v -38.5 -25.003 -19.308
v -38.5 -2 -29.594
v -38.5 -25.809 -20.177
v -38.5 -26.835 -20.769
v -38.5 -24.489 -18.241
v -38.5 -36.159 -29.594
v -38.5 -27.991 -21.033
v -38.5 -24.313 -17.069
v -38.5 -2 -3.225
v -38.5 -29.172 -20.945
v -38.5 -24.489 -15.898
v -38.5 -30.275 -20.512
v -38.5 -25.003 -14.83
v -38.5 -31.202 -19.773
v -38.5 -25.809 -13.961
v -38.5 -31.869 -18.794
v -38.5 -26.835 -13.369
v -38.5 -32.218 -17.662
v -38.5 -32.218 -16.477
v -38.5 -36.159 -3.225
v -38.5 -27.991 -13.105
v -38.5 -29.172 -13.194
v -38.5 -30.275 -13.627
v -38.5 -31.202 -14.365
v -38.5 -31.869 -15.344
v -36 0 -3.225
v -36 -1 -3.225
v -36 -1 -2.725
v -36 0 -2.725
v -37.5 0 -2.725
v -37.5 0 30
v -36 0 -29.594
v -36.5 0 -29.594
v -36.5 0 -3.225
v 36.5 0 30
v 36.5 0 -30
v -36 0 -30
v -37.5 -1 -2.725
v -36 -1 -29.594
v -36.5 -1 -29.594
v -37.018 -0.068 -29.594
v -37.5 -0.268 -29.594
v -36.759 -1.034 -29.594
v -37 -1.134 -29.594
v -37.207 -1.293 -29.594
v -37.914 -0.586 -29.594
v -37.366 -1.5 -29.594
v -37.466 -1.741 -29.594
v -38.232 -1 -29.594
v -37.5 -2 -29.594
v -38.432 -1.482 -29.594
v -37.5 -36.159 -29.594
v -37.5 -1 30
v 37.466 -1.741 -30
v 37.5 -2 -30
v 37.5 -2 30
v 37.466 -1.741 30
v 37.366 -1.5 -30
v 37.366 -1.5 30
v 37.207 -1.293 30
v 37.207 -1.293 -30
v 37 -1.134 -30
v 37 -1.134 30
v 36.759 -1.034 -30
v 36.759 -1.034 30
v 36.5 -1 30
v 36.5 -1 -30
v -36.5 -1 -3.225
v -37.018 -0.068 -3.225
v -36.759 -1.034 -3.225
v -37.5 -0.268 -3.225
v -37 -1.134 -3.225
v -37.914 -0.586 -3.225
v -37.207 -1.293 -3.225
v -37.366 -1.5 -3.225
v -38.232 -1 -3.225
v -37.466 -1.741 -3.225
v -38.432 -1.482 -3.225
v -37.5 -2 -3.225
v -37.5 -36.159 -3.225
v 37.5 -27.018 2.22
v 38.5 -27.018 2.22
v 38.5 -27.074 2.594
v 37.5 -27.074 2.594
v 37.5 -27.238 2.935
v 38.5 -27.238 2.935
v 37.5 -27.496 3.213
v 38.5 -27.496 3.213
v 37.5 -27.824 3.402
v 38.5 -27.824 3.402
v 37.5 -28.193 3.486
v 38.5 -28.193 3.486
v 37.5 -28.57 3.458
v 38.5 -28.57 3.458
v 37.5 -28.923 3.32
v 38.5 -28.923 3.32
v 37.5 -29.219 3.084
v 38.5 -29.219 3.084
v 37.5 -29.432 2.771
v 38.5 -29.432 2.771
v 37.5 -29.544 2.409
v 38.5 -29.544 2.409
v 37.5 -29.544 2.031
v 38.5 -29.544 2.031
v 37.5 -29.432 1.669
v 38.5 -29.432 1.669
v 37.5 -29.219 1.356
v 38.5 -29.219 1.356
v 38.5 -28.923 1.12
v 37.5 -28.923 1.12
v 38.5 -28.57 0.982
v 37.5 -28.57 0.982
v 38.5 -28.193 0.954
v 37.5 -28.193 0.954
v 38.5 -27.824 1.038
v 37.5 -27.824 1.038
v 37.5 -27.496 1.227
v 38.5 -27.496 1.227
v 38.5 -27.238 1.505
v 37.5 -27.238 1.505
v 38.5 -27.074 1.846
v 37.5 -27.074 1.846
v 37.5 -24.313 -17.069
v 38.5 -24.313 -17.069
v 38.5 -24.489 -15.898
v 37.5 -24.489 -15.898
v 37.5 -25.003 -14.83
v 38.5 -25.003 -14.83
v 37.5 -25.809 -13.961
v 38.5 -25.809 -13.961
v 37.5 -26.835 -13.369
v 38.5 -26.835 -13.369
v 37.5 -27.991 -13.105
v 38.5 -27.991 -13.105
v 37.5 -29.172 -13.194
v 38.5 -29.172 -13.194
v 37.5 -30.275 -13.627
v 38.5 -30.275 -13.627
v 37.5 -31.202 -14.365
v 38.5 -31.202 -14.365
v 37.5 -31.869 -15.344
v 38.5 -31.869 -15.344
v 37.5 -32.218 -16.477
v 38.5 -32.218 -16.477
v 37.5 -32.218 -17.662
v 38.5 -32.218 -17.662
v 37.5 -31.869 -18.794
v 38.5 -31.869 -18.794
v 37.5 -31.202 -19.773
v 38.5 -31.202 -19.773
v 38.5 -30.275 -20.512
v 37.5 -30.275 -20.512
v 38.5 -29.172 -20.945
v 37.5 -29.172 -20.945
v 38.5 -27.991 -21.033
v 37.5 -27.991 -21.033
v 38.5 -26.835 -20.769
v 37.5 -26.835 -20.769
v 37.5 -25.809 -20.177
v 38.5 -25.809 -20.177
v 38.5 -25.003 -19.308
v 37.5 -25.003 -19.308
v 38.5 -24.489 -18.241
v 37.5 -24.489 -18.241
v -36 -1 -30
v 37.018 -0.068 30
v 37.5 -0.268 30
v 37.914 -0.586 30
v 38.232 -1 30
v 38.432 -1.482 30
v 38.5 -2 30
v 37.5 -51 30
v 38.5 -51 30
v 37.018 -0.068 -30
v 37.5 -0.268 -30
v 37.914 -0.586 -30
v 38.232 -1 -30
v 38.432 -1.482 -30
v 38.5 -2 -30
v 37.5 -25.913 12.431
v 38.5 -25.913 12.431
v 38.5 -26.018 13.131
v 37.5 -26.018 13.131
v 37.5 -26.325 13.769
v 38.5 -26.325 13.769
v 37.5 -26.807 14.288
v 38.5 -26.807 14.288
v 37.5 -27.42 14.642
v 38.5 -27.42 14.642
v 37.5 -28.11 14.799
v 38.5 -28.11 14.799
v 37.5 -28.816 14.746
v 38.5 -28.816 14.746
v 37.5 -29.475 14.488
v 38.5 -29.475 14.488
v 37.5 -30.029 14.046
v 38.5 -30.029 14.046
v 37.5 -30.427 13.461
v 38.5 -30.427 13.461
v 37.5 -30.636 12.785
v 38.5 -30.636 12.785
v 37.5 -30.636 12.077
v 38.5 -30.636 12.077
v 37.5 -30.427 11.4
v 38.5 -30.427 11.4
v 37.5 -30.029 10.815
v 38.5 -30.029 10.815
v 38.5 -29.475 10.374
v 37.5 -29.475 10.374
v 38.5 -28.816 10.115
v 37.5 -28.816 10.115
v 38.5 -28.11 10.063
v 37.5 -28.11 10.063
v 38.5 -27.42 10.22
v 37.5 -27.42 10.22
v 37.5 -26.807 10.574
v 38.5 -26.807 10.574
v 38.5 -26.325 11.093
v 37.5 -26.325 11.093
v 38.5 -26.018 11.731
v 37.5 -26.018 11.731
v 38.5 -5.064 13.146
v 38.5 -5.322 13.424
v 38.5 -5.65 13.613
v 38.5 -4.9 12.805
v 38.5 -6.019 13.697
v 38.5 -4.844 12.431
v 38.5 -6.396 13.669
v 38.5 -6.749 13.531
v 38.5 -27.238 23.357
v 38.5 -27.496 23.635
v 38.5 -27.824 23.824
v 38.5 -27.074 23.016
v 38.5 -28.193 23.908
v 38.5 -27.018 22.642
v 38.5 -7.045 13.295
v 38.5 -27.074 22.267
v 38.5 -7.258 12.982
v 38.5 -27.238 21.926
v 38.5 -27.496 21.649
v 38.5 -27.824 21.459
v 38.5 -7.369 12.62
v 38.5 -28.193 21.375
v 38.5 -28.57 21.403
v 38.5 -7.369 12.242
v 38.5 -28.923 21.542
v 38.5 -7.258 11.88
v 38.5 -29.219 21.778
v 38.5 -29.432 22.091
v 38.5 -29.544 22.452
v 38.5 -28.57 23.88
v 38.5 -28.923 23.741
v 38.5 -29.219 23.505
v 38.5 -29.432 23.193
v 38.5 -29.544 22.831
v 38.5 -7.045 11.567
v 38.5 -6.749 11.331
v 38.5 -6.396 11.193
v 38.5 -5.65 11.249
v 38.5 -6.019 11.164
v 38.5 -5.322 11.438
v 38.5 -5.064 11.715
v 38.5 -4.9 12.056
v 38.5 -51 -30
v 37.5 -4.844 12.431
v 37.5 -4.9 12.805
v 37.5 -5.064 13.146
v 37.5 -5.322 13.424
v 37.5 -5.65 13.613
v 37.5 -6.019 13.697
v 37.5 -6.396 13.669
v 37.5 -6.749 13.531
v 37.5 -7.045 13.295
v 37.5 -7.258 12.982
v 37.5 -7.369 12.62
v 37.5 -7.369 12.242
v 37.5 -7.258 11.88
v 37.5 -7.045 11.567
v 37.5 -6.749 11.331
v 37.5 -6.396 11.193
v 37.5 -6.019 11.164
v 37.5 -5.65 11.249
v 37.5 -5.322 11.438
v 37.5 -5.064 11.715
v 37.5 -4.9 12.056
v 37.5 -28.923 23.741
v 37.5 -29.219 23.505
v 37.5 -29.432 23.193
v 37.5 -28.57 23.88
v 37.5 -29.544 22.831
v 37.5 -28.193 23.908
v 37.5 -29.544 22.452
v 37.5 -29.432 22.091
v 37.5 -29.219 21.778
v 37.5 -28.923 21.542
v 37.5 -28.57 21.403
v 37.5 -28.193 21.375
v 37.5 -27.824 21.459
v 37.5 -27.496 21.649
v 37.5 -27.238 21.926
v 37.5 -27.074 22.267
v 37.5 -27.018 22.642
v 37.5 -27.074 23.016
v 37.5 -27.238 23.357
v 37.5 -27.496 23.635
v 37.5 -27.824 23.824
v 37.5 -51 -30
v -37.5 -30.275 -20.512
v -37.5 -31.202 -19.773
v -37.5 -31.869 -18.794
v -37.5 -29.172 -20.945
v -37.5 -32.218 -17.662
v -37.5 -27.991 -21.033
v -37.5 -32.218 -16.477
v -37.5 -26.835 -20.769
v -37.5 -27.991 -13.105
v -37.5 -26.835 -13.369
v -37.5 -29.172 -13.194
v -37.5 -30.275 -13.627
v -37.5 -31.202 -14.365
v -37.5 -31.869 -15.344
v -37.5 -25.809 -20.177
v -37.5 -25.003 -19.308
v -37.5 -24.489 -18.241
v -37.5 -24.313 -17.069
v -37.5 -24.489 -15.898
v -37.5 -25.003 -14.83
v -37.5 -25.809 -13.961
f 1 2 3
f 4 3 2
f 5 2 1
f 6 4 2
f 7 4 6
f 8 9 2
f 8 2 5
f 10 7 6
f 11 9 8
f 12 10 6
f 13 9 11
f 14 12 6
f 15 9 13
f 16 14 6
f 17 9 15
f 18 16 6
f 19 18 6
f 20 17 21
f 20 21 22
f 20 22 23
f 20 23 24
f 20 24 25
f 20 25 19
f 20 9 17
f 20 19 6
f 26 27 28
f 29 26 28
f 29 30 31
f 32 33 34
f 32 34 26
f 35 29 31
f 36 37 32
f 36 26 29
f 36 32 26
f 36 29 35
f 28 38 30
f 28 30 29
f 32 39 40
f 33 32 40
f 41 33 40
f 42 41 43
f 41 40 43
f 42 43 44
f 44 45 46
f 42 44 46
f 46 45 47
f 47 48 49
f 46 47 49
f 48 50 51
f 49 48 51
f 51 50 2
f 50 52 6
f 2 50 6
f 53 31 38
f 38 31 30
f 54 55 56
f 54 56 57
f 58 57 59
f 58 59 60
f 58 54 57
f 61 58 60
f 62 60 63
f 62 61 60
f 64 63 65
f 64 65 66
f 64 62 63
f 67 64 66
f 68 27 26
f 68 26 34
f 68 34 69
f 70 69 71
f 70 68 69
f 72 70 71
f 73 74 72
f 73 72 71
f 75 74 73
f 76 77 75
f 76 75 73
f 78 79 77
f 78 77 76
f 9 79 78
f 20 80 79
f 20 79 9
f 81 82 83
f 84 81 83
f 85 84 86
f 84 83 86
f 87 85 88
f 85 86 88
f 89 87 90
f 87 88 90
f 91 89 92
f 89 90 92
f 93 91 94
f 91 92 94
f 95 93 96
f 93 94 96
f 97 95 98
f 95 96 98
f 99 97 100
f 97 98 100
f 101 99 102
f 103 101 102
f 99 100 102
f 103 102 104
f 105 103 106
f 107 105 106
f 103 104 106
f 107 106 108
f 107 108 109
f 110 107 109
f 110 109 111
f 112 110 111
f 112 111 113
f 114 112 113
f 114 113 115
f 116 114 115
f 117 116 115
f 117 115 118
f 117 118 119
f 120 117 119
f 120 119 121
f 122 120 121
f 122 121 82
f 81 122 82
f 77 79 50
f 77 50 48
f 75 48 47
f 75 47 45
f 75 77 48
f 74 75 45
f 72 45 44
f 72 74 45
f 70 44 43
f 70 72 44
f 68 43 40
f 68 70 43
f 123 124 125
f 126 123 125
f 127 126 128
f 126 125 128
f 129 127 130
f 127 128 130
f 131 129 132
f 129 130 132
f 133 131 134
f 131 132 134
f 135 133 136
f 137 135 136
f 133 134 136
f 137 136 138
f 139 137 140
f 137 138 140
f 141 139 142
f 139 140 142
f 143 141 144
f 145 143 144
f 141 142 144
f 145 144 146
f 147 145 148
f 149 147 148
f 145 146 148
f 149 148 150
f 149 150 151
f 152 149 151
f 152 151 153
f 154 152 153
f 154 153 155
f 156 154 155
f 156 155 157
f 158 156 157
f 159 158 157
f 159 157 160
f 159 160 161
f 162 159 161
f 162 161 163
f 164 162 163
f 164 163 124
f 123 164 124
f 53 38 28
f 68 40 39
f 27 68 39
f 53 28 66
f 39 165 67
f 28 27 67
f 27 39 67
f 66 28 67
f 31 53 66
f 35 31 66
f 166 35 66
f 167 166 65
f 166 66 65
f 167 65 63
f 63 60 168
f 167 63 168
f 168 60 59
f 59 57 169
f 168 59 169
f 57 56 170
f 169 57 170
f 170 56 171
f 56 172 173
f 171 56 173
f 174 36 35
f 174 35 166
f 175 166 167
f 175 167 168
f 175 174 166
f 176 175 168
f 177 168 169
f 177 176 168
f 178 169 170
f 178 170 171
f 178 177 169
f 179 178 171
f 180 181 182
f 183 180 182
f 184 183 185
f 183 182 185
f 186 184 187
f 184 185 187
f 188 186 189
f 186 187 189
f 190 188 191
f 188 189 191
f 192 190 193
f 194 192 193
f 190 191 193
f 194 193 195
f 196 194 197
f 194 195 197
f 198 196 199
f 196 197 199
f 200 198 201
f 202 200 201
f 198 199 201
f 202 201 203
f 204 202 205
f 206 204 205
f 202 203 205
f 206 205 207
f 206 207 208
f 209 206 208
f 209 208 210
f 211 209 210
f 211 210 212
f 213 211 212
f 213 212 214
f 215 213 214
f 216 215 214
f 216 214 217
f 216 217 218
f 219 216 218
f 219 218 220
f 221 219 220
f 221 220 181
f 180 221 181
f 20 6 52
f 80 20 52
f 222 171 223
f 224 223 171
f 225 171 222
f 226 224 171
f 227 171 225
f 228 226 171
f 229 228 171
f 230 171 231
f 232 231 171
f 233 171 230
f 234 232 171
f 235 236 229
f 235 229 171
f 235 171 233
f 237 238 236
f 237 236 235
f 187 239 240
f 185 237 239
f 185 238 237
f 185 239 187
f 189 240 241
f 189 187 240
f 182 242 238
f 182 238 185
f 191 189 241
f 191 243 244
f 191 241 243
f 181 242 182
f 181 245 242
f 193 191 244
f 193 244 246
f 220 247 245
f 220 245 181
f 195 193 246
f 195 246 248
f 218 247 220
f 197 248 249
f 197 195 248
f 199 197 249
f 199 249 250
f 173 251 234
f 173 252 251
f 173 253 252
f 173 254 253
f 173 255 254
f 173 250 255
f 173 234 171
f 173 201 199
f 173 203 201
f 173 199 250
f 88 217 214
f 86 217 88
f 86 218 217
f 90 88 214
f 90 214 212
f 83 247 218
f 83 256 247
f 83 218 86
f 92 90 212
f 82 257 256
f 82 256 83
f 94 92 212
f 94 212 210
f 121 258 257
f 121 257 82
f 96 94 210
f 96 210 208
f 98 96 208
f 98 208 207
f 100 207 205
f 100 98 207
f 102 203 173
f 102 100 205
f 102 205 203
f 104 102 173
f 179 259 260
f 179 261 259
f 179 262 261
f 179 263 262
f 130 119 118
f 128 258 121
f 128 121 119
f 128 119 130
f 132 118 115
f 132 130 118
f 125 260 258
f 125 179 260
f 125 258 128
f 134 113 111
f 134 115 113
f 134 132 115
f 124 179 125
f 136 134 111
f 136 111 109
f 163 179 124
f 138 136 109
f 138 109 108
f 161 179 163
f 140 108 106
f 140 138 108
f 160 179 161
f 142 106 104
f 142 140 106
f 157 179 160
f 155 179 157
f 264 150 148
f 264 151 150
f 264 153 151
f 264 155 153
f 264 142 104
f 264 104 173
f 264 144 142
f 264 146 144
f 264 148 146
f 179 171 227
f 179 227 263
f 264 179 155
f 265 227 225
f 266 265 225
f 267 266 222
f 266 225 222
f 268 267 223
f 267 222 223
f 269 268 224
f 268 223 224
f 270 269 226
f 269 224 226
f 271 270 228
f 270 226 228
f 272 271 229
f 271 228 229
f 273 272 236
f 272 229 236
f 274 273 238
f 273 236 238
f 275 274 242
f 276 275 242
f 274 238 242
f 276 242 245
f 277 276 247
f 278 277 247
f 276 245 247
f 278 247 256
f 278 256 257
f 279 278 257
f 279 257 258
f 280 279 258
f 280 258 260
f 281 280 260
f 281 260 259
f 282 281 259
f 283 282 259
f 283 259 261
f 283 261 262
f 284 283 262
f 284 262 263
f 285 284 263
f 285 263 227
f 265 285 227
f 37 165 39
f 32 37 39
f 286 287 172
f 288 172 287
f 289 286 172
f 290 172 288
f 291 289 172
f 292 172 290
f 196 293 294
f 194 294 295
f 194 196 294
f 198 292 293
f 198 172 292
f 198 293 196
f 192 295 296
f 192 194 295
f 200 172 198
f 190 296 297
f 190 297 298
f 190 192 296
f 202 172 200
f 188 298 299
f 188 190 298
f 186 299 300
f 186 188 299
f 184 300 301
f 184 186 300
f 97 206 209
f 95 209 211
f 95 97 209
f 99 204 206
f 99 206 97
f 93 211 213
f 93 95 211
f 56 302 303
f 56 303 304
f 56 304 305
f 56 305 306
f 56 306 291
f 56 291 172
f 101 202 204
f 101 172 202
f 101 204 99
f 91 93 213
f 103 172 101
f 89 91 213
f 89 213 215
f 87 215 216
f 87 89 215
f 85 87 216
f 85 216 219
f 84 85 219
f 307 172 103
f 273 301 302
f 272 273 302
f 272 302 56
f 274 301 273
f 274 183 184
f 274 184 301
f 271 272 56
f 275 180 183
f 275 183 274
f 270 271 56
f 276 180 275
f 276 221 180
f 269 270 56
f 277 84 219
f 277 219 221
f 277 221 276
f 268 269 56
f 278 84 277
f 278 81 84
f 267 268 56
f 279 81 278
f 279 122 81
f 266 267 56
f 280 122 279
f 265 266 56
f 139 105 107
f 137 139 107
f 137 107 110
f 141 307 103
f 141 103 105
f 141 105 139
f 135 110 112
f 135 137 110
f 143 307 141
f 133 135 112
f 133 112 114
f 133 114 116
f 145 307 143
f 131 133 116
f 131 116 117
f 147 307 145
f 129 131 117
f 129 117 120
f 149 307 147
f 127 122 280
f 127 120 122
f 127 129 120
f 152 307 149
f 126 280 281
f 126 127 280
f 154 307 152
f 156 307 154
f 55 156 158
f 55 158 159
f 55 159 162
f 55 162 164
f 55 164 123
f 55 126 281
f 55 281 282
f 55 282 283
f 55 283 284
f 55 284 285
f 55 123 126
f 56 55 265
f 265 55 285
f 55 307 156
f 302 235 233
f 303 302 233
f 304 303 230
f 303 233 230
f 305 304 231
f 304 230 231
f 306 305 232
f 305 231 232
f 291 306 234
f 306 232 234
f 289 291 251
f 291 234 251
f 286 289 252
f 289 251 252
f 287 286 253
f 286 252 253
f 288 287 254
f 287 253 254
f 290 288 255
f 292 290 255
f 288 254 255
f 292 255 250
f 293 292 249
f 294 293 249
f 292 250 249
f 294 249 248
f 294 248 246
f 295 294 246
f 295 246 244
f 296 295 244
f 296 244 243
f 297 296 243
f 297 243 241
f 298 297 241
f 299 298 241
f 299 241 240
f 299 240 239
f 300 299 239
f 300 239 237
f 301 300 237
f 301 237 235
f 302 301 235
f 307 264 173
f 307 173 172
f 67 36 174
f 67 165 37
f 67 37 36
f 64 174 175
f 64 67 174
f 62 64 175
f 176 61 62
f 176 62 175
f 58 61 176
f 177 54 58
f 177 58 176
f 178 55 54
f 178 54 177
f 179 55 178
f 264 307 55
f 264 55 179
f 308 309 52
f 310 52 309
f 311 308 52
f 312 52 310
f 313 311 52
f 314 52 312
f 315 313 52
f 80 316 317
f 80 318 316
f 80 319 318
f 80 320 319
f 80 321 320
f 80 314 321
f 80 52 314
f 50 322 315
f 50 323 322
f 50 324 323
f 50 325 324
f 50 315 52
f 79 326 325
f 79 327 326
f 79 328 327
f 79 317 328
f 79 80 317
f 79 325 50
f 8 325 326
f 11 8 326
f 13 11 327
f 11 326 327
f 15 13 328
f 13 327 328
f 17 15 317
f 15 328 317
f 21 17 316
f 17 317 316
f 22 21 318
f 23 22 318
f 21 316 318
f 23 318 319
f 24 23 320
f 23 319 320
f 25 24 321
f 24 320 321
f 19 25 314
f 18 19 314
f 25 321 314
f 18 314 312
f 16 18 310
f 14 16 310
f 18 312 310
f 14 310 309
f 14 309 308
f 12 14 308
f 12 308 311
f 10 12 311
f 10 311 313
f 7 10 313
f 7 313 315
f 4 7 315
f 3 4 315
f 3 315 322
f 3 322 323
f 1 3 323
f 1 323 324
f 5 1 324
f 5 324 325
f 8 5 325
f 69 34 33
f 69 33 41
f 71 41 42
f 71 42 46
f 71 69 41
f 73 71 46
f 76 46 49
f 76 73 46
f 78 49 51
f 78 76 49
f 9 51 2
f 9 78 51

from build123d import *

# Parameters (mm, degrees)
SKETCH1_W                     = 75
SKETCH1_H                     = 60
BASE_FLANGE1_DEPTH            = 1
EDGE_FLANGE1_STRIP_W          = 6
EDGE_FLANGE1_STRIP_H          = 1
EDGE_FLANGE1_STRIP_CUT_DEPTH  = 60
EDGE_FLANGE1_DEPTH            = 60
EDGE_FLANGE3_STRIP_W          = 6
EDGE_FLANGE3_STRIP_H          = 1
EDGE_FLANGE3_STRIP_CUT_DEPTH  = 26.369340124
EDGE_FLANGE3_RELIEF_W         = 6.5
EDGE_FLANGE3_RELIEF_H         = 0.5
EDGE_FLANGE3_RELIEF_CUT_DEPTH = 1
EDGE_FLANGE3_DEPTH            = 26.369340124
SKETCH15_R                    = 1.27
SKETCH15_R_2                  = 2.3749
SKETCH15_R_3                  = 3.975
CUT_EXTRUDE4_DEPTH            = 98.10818709


# Sheet-metal steps are written as plain solids
with BuildPart() as part:
    # Sketch1 → Base-Flange1 (new body)
    with BuildSketch(Plane(origin=(0, 0, 0), x_dir=(1, 0, 0), z_dir=(0, 1, 0))):
        Rectangle(SKETCH1_W, SKETCH1_H)
    extrude(amount=-BASE_FLANGE1_DEPTH)

    # Edge-Flange1 strip (across the edge) → Edge-Flange1 strip cut (cut)
    with BuildSketch(Plane(origin=(37.5, -1, -30), x_dir=(-1, 0, 0), z_dir=(0, 0, 1))):
        with Locations((-2, -0.5)):
            Rectangle(EDGE_FLANGE1_STRIP_W, EDGE_FLANGE1_STRIP_H)
    extrude(amount=EDGE_FLANGE1_STRIP_CUT_DEPTH, mode=Mode.SUBTRACT)

    # Edge-Flange1 section (across the edge) → Edge-Flange1 (add)
    with BuildSketch(Plane(origin=(37.5, -1, -30), x_dir=(-1, 0, 0), z_dir=(0, 0, 1))):
        with BuildLine():
            Line((-1, 1), (-1, 50))
            Line((-1, 50), (0, 50))
            Line((0, 50), (0, 1))
            ThreePointArc((0, 1), (0.292893219, 0.292893219), (1, 0))
            Line((1, 0), (1, -1))
            ThreePointArc((1, -1), (-0.414213562, -0.414213562), (-1, 1))
        make_face()
    extrude(amount=EDGE_FLANGE1_DEPTH)

    # Edge-Flange3 strip (across the edge) → Edge-Flange3 strip cut (cut)
    with BuildSketch(Plane(origin=(-37.5, -1, -3.224868286), x_dir=(1, 0, 0), z_dir=(0, 0, -1))):
        with Locations((-2, -0.5)):
            Rectangle(EDGE_FLANGE3_STRIP_W, EDGE_FLANGE3_STRIP_H)
    extrude(amount=EDGE_FLANGE3_STRIP_CUT_DEPTH, mode=Mode.SUBTRACT)

    # Edge-Flange3 relief (on the sheet) → Edge-Flange3 relief cut (cut)
    with BuildSketch(Plane(origin=(-36.5, -1, -3.224868286), x_dir=(1, 0, 0), z_dir=(0, -1, 0))):
        with Locations((-2.75, 0.25)):
            Rectangle(EDGE_FLANGE3_RELIEF_W, EDGE_FLANGE3_RELIEF_H)
        with Locations((-2.75, -26.619340124)):
            Rectangle(EDGE_FLANGE3_RELIEF_W, EDGE_FLANGE3_RELIEF_H)
    extrude(amount=-EDGE_FLANGE3_RELIEF_CUT_DEPTH, mode=Mode.SUBTRACT)

    # Edge-Flange3 section (across the edge) → Edge-Flange3 (add)
    with BuildSketch(Plane(origin=(-37.5, -1, -3.224868286), x_dir=(1, 0, 0), z_dir=(0, 0, -1))):
        with BuildLine():
            Line((-1, 1), (-1, 35.1591326))
            Line((-1, 35.1591326), (0, 35.1591326))
            Line((0, 35.1591326), (0, 1))
            ThreePointArc((0, 1), (0.292893219, 0.292893219), (1, 0))
            Line((1, 0), (1, -1))
            ThreePointArc((1, -1), (-0.414213562, -0.414213562), (-1, 1))
        make_face()
    extrude(amount=EDGE_FLANGE3_DEPTH)

    # Sketch15 → Cut-Extrude4 (cut, through all)
    with BuildSketch(Plane(origin=(38.5, 0, 0), x_dir=(0, 0, -1), z_dir=(1, 0, 0))):
        with Locations(Location((-22.64162, -28.28773, 0), (0, 0, 90))):
            Circle(SKETCH15_R)
        with Locations(Location((-12.43082, -28.28773, 0), (0, 0, 90))):
            Circle(SKETCH15_R_2)
        with Locations(Location((-2.22002, -28.28773, 0), (0, 0, 90))):
            Circle(SKETCH15_R)
        with Locations(Location((-12.43082, -6.11353, 0), (0, 0, 90))):
            Circle(SKETCH15_R)
        with Locations(Location((17.06918, -28.28773, 0), (0, 0, 90))):
            Circle(SKETCH15_R_3)
    extrude(amount=-CUT_EXTRUDE4_DEPTH, mode=Mode.SUBTRACT)


solid = part.part
